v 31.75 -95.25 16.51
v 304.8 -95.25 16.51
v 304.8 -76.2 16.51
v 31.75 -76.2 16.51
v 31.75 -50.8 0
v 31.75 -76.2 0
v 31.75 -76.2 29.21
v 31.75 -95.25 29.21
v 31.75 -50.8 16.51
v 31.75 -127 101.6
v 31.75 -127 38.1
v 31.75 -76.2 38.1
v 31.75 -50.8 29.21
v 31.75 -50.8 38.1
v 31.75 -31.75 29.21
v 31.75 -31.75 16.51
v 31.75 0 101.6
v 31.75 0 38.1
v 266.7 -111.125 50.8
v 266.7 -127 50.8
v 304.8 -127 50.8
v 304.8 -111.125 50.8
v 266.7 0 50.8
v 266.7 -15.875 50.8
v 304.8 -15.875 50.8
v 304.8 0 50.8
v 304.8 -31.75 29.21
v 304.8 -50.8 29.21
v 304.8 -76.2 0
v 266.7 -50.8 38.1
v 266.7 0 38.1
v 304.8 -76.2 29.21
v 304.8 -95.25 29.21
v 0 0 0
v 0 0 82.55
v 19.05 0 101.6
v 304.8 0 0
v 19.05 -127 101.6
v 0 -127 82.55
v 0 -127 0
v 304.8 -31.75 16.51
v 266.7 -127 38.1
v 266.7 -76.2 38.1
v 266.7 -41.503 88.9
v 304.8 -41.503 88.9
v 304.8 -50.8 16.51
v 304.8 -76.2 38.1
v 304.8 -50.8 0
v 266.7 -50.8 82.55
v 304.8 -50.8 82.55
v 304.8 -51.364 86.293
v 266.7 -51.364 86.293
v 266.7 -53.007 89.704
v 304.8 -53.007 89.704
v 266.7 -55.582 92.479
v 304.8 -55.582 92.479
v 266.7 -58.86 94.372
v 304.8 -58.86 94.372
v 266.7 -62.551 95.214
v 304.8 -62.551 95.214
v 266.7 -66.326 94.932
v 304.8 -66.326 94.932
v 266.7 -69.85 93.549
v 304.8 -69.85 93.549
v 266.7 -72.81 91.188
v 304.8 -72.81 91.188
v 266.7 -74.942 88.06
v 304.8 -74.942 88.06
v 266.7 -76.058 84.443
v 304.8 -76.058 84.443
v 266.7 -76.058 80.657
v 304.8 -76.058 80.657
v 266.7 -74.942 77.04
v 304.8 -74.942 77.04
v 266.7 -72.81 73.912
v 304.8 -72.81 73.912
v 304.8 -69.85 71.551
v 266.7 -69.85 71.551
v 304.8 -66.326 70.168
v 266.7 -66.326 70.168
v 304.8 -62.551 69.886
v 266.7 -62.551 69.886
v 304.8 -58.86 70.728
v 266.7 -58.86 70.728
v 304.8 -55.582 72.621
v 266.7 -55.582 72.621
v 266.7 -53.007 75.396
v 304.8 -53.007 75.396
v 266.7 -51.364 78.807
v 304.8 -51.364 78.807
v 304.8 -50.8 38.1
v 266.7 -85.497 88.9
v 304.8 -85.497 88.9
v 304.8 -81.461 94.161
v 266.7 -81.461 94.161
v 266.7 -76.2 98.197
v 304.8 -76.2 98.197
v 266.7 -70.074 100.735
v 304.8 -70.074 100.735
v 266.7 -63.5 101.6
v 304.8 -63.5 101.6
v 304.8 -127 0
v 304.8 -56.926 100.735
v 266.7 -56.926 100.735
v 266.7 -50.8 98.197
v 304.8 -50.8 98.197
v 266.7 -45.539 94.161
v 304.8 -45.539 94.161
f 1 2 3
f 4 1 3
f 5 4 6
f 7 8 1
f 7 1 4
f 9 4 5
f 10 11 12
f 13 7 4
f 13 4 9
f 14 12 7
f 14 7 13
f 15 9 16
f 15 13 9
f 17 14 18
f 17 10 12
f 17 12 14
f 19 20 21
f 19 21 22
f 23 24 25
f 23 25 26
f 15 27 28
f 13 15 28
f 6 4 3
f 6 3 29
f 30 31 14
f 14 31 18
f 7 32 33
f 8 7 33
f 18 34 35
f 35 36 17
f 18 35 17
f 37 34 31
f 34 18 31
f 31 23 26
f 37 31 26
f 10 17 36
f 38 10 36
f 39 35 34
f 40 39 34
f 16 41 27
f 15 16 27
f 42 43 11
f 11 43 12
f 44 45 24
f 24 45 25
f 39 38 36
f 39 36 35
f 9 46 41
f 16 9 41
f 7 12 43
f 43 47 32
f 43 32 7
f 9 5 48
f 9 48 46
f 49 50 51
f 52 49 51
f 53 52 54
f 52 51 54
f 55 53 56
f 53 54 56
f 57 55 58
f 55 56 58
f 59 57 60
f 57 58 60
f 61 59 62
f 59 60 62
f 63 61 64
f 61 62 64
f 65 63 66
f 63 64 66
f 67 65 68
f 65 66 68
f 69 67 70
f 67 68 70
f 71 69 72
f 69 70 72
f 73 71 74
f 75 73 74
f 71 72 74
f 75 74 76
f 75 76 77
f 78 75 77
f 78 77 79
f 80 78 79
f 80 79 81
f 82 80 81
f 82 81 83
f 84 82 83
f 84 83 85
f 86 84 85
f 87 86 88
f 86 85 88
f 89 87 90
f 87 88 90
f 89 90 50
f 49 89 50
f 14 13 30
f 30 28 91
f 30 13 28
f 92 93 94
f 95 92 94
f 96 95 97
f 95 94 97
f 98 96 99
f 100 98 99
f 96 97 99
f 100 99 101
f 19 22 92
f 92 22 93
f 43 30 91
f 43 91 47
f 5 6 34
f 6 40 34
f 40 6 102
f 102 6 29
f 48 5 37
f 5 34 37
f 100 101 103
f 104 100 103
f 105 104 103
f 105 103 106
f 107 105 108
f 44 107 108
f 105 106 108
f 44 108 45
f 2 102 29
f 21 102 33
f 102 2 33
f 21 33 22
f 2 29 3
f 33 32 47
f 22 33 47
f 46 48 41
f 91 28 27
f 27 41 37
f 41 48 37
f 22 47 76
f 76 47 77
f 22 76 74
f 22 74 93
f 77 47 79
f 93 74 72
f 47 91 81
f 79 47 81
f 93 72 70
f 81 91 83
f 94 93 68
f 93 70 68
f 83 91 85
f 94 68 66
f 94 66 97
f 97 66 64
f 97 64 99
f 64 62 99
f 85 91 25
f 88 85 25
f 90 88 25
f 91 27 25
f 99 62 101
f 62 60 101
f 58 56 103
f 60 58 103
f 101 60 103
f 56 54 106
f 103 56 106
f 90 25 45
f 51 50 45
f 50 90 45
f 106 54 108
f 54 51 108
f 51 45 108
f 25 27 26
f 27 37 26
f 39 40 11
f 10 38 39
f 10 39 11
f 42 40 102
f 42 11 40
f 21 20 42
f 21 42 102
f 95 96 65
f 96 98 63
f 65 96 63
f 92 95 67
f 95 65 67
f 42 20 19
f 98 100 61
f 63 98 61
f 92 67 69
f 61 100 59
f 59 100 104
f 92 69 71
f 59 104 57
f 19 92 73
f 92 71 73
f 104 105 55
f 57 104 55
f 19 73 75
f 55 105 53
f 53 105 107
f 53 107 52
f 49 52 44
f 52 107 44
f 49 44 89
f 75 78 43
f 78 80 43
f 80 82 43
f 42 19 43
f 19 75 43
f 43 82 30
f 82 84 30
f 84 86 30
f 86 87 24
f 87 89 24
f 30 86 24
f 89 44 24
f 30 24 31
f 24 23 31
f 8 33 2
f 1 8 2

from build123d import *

# Parameters (mm, degrees)
F1_DEPTH = 127
F3_DEPTH = 38.1
F5_DEPTH = 273.05
F6_R     = 12.7
F7_DEPTH = 38.1


with BuildPart() as f1:
    # F0 (on Front) → F1 (new body)
    with BuildSketch(Plane.XZ):
        Polygon((0, 82.55), (0, 0), (304.8, 0), (304.8, 101.6), (266.7, 101.6), (266.7, 38.1), (31.75, 38.1), (31.75, 101.6), (19.05, 101.6), align=None)
    extrude(amount=F1_DEPTH)

    # F2 (on face) → F3 (cut)
    with BuildSketch(Plane.YZ.offset(304.8)):
        with BuildLine():
            Line((-127, 101.6), (-127, 50.8))
            Line((-127, 50.8), (-111.125, 50.8))
            Line((-111.125, 50.8), (-85.497045, 88.9))
            ThreePointArc((-85.497045, 88.9), (-76.2, 98.197045), (-63.5, 101.6))
            Line((-63.5, 101.6), (-127, 101.6))
        make_face()
        with BuildLine():
            Line((0, 101.6), (-63.5, 101.6))
            ThreePointArc((-63.5, 101.6), (-50.8, 98.197045), (-41.502955, 88.9))
            Line((-41.502955, 88.9), (-15.875, 50.8))
            Line((-15.875, 50.8), (0, 50.8))
            Line((0, 50.8), (0, 101.6))
        make_face()
    extrude(amount=-F3_DEPTH, mode=Mode.SUBTRACT)

    # F4 (on face) → F5 (cut)
    with BuildSketch(Plane.YZ.offset(304.8)):
        Polygon((-76.2, 16.51), (-76.2, 0), (-50.8, 0), (-50.8, 16.51), (-31.75, 16.51), (-31.75, 29.21), (-50.8, 29.21), (-50.8, 38.1), (-76.2, 38.1), (-76.2, 29.21), (-95.25, 29.21), (-95.25, 16.51), align=None)
    extrude(amount=-F5_DEPTH, mode=Mode.SUBTRACT)

    # F6 (on face) → F7 (cut)
    with BuildSketch(Plane.YZ.offset(304.8)):
        with Locations((-63.5, 82.55)):
            Circle(F6_R)
    extrude(amount=-F7_DEPTH, mode=Mode.SUBTRACT)


solid = f1.part
